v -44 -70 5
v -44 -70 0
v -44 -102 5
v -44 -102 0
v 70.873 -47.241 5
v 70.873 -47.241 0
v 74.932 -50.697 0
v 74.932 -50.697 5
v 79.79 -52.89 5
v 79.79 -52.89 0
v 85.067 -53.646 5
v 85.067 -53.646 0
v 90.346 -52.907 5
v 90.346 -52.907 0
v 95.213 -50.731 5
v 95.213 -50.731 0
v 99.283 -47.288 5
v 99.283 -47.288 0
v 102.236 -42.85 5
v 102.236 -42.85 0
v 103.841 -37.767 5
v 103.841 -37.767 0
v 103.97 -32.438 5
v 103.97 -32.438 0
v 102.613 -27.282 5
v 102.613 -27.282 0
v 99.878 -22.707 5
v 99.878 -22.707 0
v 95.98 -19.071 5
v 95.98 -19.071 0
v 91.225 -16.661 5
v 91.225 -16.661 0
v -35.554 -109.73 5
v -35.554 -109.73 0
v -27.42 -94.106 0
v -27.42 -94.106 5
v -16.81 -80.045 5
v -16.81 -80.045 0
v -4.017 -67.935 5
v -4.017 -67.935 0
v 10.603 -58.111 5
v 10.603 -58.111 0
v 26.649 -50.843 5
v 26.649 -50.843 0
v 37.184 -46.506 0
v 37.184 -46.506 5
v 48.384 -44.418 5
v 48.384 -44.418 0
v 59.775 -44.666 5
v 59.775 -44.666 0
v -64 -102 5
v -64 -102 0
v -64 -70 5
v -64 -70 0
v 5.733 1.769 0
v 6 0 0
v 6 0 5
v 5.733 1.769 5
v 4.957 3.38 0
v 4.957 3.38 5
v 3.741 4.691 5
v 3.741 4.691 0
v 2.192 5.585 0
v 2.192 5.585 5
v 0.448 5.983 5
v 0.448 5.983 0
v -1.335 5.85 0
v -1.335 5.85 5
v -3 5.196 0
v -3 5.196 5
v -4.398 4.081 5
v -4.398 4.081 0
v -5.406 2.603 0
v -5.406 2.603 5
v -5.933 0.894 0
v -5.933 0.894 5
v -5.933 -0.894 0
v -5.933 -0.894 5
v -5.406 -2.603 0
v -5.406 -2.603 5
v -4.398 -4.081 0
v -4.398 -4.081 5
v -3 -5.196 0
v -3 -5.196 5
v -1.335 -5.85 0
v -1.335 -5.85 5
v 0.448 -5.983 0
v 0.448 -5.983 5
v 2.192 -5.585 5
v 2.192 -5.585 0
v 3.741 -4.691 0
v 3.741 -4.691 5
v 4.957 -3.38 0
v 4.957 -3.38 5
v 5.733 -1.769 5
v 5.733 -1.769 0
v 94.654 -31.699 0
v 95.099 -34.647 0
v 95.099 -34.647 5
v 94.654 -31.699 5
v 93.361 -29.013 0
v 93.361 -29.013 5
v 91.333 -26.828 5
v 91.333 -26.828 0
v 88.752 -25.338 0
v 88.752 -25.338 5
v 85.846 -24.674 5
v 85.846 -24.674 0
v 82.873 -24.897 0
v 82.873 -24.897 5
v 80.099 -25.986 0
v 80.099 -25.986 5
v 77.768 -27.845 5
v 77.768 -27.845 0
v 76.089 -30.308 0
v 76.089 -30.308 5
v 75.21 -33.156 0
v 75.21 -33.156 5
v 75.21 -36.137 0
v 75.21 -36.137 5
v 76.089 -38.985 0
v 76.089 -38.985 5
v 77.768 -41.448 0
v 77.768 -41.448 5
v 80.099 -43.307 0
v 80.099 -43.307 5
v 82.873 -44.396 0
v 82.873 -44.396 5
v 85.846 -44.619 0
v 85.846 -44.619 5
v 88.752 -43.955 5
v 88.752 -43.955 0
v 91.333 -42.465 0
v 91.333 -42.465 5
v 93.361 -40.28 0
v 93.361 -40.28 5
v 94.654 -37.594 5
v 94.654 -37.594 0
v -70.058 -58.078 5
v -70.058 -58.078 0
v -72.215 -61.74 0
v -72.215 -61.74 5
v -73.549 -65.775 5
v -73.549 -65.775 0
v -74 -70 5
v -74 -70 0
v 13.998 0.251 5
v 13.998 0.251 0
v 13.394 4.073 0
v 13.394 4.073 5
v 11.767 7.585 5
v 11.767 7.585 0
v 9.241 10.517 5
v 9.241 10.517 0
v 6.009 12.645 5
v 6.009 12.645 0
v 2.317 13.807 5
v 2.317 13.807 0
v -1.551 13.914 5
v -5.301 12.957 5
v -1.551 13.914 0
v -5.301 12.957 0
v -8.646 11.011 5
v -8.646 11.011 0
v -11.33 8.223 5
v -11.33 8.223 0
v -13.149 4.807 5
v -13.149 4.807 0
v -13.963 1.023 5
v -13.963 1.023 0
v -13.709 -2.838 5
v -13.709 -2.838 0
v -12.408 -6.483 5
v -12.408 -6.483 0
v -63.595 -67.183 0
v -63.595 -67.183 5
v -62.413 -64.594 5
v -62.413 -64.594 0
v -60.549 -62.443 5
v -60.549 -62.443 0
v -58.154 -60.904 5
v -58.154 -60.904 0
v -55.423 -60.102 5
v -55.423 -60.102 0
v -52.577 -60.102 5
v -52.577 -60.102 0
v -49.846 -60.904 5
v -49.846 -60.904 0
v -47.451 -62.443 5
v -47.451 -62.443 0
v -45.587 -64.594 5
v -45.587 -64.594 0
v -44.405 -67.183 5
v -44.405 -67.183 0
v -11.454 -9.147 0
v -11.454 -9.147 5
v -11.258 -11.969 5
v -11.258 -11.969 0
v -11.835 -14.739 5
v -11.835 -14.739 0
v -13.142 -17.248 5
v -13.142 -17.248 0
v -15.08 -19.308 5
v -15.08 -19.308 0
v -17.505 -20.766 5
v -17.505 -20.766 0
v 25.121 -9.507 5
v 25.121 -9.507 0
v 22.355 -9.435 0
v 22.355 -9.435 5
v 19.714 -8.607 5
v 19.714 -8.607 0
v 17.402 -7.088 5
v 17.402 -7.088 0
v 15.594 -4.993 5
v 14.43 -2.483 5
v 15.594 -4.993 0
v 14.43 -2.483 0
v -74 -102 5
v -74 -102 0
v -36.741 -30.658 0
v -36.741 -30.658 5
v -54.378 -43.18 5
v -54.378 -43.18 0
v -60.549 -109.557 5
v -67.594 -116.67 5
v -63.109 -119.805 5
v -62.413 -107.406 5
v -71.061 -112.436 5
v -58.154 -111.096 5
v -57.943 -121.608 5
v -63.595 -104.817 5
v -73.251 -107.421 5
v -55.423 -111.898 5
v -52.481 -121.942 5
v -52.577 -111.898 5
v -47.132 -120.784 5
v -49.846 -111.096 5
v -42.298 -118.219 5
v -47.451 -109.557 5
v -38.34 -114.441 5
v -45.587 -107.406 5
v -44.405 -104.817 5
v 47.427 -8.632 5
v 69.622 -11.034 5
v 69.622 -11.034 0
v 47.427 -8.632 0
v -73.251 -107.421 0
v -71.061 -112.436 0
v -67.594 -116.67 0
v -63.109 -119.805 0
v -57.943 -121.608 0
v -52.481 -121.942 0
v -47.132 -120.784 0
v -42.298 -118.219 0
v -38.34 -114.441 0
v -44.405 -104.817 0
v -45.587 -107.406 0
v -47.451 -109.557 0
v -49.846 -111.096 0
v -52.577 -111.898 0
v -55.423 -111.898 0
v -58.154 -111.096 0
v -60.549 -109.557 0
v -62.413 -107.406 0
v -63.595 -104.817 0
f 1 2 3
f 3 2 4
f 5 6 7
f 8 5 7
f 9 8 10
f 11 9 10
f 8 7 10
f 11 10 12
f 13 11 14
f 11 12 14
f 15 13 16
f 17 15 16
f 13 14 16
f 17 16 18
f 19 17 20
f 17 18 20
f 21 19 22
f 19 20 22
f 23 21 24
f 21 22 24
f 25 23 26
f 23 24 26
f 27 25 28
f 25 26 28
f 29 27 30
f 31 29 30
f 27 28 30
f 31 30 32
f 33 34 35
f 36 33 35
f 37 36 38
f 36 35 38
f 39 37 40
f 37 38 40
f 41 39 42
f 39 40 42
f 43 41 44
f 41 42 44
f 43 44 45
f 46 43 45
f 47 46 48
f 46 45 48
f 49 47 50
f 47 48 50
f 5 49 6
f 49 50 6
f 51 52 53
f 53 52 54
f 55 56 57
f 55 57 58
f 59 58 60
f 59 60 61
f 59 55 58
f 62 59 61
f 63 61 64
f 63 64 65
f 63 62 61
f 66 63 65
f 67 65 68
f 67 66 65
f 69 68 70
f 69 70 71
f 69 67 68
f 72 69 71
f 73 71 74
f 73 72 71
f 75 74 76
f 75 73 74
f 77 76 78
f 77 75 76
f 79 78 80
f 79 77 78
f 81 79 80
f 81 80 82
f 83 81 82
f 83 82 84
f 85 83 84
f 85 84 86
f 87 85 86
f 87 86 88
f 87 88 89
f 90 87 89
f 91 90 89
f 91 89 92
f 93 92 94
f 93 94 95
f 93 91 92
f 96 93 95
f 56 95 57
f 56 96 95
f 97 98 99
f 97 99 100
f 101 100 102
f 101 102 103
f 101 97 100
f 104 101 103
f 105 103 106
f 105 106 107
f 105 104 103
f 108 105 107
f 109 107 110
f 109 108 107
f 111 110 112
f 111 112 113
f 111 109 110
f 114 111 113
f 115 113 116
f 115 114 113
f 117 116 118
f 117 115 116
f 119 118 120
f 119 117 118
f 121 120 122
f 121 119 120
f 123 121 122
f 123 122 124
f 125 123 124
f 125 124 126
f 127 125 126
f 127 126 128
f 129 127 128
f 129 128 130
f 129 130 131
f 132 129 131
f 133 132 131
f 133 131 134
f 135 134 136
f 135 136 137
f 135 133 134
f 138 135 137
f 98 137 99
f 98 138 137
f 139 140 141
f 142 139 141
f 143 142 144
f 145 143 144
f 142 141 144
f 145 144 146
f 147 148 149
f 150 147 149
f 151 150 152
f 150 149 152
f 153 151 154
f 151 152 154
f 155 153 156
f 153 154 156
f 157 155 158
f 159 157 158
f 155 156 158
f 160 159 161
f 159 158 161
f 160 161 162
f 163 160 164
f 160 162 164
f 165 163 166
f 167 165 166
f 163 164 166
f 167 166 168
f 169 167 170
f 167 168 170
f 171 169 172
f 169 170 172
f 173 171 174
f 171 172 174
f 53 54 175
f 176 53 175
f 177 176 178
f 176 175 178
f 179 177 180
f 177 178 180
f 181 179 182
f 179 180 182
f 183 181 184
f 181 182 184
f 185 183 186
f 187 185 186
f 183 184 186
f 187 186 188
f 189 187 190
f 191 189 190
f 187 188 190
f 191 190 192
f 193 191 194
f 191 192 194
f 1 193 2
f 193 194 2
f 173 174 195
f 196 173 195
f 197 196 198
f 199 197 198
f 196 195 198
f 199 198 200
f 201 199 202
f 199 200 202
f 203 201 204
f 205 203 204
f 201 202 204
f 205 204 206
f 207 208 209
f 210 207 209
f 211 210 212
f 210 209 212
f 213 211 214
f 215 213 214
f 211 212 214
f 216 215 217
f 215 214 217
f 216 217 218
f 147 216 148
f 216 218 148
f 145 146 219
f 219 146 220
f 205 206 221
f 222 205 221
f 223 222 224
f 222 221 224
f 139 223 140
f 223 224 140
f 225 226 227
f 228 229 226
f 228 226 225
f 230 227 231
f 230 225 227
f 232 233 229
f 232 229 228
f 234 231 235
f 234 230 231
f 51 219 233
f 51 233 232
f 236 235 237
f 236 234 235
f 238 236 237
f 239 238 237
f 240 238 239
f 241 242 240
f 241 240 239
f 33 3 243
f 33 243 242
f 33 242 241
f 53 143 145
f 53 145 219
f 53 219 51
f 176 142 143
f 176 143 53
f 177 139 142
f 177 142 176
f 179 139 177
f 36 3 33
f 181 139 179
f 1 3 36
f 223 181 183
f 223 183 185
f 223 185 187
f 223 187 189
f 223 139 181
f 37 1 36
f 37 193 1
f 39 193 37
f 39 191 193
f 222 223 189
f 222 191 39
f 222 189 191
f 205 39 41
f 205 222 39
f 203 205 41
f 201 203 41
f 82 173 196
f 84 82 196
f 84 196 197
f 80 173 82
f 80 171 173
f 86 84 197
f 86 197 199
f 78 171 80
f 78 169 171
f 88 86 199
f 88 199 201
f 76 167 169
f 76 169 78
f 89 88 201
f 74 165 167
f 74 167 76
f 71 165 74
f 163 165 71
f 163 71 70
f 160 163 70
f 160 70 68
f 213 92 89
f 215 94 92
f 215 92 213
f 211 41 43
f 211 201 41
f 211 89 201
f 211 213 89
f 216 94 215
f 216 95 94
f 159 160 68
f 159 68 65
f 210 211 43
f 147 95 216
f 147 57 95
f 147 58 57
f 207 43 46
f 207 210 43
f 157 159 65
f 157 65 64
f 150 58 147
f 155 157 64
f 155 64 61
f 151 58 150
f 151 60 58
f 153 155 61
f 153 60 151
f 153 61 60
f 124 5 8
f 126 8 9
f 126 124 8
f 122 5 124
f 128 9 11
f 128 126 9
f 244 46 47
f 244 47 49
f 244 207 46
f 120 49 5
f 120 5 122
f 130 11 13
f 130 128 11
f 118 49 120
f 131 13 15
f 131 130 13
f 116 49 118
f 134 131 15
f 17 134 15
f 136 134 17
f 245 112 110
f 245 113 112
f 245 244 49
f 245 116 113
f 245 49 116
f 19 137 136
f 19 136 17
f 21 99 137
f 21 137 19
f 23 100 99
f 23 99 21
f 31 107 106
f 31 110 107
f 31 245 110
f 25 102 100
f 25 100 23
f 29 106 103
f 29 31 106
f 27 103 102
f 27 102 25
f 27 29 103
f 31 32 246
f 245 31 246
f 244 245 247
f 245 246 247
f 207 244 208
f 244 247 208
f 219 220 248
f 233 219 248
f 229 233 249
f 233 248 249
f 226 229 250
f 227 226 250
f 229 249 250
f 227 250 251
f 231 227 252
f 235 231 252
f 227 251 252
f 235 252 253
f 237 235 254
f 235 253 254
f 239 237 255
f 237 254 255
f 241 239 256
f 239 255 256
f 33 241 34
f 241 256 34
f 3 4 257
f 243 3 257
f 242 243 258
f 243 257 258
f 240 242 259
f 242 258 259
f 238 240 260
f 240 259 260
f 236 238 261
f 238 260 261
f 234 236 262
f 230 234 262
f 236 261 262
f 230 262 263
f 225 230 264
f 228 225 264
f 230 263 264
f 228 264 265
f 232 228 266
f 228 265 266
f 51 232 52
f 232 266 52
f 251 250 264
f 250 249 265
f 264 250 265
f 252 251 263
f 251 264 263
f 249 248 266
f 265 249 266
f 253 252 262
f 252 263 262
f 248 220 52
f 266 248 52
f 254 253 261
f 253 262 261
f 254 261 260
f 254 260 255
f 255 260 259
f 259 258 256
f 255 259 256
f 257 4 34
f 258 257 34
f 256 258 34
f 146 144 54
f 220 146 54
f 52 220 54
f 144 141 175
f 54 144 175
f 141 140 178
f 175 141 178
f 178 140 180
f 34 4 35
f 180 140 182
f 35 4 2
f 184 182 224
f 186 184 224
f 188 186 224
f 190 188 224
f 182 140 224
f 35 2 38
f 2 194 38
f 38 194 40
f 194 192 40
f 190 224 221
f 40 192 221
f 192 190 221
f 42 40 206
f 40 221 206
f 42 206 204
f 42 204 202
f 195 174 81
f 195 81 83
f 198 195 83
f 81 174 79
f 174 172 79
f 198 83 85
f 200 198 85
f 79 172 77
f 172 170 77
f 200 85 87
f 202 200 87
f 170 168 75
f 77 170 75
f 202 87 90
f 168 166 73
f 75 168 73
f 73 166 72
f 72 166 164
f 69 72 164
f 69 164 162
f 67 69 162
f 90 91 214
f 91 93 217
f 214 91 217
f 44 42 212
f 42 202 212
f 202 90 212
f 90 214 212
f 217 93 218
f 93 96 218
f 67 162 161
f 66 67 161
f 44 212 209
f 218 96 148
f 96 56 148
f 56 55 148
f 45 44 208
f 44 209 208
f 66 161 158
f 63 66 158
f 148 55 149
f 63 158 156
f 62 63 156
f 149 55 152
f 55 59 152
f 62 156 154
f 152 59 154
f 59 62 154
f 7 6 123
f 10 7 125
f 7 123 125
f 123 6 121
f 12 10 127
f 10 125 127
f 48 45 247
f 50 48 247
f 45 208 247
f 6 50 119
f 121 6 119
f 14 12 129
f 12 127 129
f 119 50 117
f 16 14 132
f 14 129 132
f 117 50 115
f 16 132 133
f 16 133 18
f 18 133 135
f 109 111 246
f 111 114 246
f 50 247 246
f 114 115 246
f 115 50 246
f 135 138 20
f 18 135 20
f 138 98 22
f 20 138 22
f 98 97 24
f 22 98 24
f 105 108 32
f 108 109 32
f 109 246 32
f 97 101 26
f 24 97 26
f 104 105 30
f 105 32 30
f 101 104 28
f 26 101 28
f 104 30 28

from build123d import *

# Parameters (mm, degrees)
SKETCH1_R           = 6
SKETCH1_R_2         = 10
BOSS_EXTRUDE5_DEPTH = 5


with BuildPart() as part:
    # Sketch1 → Boss-Extrude5 (new body)
    with BuildSketch(Plane.XY):
        with BuildLine():
            ThreePointArc((-70.058465936, -58.078352807), (-72.989066837, -63.721836205), (-74, -70))
            Line((-74, -70), (-74, -102))
            ThreePointArc((-74, -102), (-57.94255977, -121.607555239), (-35.554377754, -109.730395847))
            ThreePointArc((-35.554377754, -109.730395847), (-10.665501502, -73.723982253), (26.649375188, -50.843467428))
            ThreePointArc((26.649375188, -50.843467428), (48.384433069, -44.417618227), (70.872883052, -47.241427079))
            ThreePointArc((70.872883052, -47.241427079), (100.915737424, -45.173387051), (91.224909648, -16.661323894))
            ThreePointArc((91.224909648, -16.661323894), (58.568789172, -9.425322294), (25.12069127, -9.506995785))
            ThreePointArc((25.12069127, -9.506995785), (17.4015399, -7.087809111), (13.997757222, 0.250584822))
            ThreePointArc((13.997757222, 0.250584822), (-3.45943961, 13.565849682), (-12.408356532, -6.483262156))
            ThreePointArc((-12.408356532, -6.483262156), (-11.834915893, -14.73854087), (-17.505199272, -20.765675115))
            ThreePointArc((-17.505199272, -20.765675115), (-45.782270653, -36.604484887), (-70.058465936, -58.078352807))
        make_face()
        with BuildLine():
            ThreePointArc((-44, -102), (-54, -112), (-64, -102))
            Line((-64, -102), (-64, -70))
            ThreePointArc((-64, -70), (-54, -60), (-44, -70))
            Line((-44, -70), (-44, -102))
        make_face(mode=Mode.SUBTRACT)
        Circle(SKETCH1_R, mode=Mode.SUBTRACT)
        with Locations((85.098500813, -34.646515436)):
            Circle(SKETCH1_R_2, mode=Mode.SUBTRACT)
    extrude(amount=BOSS_EXTRUDE5_DEPTH)


solid = part.part
